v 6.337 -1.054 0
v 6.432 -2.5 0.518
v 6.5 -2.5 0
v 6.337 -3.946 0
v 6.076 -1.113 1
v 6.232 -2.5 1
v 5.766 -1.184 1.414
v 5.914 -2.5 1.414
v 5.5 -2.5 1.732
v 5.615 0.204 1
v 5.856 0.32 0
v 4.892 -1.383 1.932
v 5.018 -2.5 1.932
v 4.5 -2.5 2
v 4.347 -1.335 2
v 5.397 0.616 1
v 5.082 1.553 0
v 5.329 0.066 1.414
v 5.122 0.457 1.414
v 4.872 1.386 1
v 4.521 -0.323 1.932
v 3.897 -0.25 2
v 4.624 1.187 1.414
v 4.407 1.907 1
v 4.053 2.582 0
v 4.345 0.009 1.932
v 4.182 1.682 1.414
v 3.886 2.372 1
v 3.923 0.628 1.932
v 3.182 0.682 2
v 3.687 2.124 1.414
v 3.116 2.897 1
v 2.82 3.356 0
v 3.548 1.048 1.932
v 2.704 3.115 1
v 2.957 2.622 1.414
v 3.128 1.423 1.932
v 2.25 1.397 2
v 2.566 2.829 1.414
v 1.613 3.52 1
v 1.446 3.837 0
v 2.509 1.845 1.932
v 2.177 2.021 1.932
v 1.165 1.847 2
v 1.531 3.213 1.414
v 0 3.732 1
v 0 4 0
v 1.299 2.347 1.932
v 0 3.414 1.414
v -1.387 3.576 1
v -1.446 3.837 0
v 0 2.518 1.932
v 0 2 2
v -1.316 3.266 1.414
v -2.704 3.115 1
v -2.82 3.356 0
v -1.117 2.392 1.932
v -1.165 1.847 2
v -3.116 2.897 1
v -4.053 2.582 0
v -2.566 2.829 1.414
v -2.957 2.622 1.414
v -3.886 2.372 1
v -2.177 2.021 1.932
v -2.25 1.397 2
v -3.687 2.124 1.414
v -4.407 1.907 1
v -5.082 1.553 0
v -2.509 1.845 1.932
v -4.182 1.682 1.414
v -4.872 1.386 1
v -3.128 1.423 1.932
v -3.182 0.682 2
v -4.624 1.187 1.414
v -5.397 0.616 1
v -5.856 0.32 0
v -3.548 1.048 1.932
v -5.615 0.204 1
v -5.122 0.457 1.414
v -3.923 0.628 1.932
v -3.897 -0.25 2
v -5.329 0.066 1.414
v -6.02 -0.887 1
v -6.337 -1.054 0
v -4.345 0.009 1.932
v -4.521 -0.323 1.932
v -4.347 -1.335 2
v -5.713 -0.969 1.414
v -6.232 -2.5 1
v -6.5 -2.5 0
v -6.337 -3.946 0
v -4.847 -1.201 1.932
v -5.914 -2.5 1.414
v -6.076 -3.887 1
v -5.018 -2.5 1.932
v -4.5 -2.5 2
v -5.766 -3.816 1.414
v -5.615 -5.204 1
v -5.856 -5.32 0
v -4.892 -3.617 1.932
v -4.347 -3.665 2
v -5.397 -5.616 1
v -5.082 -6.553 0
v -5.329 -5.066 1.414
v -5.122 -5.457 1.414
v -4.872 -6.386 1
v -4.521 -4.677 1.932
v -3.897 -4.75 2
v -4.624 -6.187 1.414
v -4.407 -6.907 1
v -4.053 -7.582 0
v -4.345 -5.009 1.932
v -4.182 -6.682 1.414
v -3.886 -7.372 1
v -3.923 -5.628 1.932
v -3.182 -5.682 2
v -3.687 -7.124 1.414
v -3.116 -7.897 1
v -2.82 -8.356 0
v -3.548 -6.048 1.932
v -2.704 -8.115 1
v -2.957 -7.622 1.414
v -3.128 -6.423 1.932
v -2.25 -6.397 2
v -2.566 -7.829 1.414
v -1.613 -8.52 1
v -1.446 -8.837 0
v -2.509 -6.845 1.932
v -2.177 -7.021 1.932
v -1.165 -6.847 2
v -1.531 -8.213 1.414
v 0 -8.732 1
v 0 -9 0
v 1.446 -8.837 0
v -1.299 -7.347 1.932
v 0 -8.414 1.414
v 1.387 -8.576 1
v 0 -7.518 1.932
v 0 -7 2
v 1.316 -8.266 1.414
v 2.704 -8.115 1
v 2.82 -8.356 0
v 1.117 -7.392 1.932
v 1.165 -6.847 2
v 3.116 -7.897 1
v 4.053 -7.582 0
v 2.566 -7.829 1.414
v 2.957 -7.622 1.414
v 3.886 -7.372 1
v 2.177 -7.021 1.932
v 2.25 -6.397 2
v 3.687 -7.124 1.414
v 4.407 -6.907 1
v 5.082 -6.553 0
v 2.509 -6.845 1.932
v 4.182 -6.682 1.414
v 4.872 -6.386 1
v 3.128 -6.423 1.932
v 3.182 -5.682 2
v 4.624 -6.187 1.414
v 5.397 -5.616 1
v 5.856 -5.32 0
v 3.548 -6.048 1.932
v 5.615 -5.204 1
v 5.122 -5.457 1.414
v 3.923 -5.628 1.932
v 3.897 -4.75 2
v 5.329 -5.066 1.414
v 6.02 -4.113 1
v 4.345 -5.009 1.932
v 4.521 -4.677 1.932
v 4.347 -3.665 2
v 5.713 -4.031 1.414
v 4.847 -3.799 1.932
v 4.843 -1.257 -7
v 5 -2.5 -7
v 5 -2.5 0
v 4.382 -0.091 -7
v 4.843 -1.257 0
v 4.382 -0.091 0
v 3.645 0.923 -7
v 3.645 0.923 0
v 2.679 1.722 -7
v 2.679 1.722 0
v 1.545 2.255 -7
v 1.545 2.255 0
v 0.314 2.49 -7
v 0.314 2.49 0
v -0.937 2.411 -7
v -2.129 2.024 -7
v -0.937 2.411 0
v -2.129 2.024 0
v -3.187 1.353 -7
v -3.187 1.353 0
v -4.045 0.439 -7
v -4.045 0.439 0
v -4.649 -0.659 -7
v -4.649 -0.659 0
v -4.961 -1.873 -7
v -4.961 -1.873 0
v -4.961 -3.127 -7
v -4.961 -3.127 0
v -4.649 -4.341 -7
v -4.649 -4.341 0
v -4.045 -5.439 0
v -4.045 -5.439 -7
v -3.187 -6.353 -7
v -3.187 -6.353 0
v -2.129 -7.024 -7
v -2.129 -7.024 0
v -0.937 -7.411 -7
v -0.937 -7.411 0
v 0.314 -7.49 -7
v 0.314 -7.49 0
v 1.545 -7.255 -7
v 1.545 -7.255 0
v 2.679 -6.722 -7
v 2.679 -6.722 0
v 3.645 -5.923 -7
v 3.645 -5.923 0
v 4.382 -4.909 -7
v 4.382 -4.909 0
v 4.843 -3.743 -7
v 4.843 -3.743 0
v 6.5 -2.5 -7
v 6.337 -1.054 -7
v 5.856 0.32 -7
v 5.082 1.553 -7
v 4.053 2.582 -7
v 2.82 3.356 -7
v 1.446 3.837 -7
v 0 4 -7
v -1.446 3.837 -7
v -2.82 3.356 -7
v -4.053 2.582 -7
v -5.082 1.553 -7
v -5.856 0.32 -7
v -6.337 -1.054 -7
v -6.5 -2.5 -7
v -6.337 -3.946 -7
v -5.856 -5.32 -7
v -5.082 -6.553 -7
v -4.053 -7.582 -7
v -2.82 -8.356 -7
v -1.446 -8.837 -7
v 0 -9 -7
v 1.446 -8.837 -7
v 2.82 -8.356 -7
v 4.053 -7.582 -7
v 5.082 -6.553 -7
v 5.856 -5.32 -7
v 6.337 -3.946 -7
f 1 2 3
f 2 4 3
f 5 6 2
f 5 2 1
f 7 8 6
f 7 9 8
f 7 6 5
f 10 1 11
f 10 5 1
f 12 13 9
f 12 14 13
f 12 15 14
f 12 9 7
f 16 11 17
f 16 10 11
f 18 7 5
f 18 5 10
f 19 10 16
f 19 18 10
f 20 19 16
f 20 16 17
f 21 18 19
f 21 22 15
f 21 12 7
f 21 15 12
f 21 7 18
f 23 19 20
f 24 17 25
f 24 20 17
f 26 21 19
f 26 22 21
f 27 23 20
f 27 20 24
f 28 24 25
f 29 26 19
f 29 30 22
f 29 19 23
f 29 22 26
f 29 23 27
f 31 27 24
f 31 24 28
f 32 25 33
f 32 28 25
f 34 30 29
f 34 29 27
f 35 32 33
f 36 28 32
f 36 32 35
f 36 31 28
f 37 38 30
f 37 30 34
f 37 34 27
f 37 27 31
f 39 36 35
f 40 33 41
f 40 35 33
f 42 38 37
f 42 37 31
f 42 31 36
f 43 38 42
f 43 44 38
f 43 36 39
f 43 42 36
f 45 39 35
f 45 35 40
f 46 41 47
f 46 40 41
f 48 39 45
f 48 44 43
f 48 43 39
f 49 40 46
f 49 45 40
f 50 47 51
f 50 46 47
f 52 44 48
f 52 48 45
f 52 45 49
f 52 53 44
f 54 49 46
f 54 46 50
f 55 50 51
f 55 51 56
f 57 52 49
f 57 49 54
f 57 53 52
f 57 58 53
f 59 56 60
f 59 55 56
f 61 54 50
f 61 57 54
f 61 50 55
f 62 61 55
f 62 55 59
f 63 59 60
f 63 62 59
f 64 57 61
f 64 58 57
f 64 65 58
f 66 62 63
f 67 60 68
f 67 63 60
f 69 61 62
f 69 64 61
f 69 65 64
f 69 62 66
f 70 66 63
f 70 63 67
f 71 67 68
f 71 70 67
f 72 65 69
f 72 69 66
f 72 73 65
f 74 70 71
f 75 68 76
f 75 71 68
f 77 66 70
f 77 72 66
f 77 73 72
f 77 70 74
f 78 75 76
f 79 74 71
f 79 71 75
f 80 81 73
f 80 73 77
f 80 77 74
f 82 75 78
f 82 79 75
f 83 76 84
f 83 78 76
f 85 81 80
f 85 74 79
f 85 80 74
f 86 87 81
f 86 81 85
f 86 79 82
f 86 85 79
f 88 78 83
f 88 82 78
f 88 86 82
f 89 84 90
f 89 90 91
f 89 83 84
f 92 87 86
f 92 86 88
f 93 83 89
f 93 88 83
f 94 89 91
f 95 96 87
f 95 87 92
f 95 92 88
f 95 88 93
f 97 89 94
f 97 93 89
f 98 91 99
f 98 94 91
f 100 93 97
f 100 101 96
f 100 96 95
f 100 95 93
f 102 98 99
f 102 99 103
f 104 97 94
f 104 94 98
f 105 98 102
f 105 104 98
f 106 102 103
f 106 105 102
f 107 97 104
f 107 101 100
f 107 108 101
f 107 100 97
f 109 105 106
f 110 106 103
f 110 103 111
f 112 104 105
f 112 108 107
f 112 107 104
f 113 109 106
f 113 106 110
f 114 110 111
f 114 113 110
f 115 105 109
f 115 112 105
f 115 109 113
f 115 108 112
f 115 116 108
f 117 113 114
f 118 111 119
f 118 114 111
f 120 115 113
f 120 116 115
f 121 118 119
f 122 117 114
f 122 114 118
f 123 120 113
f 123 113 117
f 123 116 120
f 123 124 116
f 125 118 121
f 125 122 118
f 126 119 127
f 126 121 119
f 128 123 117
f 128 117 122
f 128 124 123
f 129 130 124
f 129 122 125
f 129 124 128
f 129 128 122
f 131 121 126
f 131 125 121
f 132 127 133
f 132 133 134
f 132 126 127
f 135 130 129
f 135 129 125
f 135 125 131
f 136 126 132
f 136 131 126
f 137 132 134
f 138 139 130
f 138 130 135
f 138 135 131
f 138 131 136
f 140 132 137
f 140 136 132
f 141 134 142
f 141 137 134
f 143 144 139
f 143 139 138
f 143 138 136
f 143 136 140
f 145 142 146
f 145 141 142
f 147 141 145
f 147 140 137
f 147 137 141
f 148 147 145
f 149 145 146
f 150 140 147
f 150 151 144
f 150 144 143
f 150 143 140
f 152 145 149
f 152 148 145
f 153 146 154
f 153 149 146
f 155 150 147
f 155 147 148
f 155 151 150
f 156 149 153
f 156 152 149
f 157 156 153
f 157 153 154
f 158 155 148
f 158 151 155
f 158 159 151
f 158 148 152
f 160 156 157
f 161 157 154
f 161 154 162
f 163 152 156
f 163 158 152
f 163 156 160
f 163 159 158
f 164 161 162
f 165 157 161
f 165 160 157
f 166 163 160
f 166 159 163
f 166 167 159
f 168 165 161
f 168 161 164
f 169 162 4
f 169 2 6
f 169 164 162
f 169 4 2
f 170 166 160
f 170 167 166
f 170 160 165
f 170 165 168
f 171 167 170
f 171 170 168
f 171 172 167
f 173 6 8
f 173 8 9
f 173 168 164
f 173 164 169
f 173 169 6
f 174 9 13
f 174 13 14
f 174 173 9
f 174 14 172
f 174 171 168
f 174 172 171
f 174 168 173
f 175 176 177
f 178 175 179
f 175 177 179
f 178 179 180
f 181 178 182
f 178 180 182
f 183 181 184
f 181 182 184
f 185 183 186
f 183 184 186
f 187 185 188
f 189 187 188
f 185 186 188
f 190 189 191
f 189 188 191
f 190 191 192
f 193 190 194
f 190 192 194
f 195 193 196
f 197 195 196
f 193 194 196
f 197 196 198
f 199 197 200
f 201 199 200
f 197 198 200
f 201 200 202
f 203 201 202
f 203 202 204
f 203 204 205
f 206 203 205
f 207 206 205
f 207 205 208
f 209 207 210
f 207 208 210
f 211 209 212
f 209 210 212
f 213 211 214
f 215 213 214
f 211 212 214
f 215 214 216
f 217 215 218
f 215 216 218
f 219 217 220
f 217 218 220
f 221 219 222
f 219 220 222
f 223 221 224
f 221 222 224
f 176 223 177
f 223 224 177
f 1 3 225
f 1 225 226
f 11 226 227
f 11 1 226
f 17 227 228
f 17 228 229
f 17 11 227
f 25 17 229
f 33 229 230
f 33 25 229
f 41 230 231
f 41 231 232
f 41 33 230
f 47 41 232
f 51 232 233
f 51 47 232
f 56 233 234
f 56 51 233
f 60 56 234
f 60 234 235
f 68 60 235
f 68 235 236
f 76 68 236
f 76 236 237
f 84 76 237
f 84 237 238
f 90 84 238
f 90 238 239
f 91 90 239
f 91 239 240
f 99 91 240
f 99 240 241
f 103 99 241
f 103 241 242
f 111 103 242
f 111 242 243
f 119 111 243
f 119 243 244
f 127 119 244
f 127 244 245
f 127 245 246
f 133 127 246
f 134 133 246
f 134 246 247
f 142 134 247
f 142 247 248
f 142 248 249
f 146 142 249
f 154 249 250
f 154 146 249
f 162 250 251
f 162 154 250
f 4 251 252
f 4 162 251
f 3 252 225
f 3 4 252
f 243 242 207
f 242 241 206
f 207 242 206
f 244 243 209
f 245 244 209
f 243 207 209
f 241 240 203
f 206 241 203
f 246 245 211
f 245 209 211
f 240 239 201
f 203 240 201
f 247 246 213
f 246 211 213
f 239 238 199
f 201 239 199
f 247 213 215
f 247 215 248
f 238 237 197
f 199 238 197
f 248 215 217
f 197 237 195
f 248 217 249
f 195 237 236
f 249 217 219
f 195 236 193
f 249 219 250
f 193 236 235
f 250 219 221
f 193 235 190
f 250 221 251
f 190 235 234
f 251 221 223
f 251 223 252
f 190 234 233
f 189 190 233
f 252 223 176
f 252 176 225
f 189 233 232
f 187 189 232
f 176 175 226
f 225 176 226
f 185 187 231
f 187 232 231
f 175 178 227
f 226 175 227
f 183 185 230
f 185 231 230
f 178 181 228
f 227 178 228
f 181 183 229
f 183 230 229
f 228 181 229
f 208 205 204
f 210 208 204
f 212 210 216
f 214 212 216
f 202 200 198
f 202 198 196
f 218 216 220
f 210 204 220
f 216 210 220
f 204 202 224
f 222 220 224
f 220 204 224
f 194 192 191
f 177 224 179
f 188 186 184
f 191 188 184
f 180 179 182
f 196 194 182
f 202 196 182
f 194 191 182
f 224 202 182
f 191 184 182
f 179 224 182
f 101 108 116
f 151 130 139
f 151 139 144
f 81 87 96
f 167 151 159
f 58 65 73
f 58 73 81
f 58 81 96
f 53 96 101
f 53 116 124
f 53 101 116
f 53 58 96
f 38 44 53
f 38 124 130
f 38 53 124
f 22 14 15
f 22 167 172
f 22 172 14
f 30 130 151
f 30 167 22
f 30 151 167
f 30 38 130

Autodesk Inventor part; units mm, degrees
ref_plane "YZ Plane" through (0, 0, 0) normal (1, 0, 0) x (0, 1, 0)
ref_plane "XZ Plane" through (0, 0, 0) normal (0, 1, 0) x (-1, 0, 0)
ref_plane "XY Plane" through (0, 0, 0) normal (0, 0, 1) x (1, 0, 0)
sketch "Skizze1" plane through (0, 0, 0) normal (0, 0, 1) x (1, 0, 0)
  circle A0 centre (0, -2.5) radius 5 projected
  circle A1 centre (0, -2.5) radius 2.5 projected
  circle A2 centre (0, -2.5) radius 6.5
  point P0 (0, 0)
  dimension "d0" = 13
extrude "Extrusion1" add sketch "Skizze1" against normal blind 7 contours A2
thread "Gewinde1" size "M10x1.5" class "6H" standard "ANSI Metric M Profile" full length
sketch "Skizze2" plane through (0, -2.5, 0) normal (0, 0, 1) x (1, 0, 0)
  circle A0 centre (0, 0) radius 6.5
  point P0 (0, 2.5)
extrude "Extrusion2" add sketch "Skizze2" along normal blind 2
fillet "Rundung1" radius 2 1 edges at (-6.5, -2.5, 2)
properties part number "Mutter"
